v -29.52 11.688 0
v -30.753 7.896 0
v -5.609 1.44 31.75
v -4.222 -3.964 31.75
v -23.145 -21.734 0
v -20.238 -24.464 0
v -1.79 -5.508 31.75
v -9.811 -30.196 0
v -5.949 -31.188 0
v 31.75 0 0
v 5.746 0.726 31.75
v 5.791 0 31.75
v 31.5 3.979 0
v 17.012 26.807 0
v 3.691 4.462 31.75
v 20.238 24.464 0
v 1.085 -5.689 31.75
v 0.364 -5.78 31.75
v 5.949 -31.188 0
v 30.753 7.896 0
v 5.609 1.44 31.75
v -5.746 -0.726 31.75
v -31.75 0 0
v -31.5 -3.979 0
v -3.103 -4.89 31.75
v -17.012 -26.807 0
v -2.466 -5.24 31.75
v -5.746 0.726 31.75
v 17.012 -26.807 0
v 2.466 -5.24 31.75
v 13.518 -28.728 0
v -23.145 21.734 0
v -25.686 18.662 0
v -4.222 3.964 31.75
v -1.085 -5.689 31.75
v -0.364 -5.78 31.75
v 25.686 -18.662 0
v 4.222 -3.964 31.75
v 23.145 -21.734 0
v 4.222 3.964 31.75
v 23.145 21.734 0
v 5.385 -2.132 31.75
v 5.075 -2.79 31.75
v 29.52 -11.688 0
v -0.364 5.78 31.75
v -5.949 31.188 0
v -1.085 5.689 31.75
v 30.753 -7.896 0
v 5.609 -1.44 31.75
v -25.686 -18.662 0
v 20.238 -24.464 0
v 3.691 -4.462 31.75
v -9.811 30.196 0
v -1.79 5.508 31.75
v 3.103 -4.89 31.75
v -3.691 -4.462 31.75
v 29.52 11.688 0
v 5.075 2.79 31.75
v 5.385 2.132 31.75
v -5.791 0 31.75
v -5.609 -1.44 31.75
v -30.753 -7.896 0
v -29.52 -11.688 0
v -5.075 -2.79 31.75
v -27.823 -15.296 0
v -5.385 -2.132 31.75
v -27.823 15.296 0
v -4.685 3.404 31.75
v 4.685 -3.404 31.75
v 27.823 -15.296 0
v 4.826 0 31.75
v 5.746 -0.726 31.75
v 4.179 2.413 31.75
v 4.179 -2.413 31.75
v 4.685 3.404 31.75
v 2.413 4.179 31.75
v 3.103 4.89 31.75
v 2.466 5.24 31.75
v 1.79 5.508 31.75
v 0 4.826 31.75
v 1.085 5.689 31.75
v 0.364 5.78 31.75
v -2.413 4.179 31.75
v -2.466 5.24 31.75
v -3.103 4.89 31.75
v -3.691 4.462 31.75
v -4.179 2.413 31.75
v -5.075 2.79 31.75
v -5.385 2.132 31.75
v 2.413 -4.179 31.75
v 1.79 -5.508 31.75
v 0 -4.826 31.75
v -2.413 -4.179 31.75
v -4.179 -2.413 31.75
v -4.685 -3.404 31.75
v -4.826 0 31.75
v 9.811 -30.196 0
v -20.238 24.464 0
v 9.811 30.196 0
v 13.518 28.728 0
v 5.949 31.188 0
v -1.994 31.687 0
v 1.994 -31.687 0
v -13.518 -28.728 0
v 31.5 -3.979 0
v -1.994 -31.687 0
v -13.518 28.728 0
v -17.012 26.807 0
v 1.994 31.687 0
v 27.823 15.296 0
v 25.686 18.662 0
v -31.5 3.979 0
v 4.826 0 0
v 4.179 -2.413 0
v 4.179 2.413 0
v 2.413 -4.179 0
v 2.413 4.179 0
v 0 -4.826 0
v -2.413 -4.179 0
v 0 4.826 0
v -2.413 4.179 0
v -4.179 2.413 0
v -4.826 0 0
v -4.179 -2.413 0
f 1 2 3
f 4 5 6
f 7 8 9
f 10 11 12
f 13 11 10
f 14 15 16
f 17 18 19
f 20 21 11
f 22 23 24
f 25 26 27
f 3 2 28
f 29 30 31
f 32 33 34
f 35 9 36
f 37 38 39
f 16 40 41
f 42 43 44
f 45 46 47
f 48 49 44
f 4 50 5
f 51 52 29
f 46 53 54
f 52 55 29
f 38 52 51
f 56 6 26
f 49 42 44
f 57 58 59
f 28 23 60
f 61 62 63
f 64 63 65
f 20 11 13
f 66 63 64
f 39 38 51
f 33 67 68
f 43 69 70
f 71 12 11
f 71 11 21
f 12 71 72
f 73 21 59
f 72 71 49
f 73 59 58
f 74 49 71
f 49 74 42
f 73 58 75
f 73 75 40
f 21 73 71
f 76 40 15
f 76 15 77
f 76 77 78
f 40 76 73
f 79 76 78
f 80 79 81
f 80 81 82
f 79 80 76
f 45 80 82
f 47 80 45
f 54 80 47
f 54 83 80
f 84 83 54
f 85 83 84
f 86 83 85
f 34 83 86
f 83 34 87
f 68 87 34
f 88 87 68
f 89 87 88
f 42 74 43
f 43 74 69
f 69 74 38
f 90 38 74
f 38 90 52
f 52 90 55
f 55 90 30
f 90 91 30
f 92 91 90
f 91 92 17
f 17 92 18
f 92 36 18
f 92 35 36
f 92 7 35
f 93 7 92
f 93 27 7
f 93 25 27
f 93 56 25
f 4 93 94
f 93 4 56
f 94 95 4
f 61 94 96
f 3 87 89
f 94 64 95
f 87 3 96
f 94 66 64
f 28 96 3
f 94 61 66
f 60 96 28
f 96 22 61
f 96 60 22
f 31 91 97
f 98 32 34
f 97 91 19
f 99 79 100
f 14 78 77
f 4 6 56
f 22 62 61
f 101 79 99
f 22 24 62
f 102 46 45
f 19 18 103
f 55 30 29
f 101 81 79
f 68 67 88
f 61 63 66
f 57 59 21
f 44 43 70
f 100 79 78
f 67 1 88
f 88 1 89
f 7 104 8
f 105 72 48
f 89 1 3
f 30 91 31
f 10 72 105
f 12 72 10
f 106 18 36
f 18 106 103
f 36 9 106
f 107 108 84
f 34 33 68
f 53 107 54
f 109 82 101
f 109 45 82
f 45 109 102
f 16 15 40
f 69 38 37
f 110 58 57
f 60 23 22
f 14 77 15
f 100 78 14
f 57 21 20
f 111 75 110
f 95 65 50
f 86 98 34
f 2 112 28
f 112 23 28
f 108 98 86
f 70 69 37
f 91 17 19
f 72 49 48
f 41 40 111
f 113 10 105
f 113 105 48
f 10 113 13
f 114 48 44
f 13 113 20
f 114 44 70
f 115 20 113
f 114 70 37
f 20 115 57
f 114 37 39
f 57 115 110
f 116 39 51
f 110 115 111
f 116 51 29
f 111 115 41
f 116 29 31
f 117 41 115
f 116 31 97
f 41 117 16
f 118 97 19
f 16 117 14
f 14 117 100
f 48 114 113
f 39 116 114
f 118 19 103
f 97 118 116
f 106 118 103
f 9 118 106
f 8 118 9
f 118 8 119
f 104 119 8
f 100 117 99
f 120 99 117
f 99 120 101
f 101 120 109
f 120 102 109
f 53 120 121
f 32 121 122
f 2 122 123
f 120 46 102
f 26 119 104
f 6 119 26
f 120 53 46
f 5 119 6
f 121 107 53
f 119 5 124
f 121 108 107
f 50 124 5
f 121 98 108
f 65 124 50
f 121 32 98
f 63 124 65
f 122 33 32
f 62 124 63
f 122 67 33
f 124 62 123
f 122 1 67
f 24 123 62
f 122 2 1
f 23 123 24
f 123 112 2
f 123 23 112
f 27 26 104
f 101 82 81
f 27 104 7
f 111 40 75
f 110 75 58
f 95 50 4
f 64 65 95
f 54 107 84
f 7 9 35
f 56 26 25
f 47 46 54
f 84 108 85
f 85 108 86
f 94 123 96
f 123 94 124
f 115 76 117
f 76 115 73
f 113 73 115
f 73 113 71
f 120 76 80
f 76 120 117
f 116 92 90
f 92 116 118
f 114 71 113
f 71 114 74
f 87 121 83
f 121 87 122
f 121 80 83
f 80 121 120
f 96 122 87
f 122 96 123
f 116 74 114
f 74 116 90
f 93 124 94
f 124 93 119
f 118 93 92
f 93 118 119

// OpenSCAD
use <../Vitamins/Pipe.scad>;

module PipeCone(nutHeight=0.26, nutDiameter=0.6, boltDiameter=0.38, major=2.5, id=0.32) {
  difference() {
    
    // Body
    cylinder(r1=major/2, r2=boltDiameter*.6, h=(major/2), $fn=50);
    
    // Nut
    translate([0,0,(major/2) - nutHeight])
    *cylinder(r=nutDiameter/2, h=nutHeight+0.1, $fn=6);
    
    // Bolt
    translate([0,0,-0.1])
    cylinder(r=boltDiameter/2, h=major, $fn=12);
  }
}

scale([25.4, 25.4, 25.4])
PipeCone();
